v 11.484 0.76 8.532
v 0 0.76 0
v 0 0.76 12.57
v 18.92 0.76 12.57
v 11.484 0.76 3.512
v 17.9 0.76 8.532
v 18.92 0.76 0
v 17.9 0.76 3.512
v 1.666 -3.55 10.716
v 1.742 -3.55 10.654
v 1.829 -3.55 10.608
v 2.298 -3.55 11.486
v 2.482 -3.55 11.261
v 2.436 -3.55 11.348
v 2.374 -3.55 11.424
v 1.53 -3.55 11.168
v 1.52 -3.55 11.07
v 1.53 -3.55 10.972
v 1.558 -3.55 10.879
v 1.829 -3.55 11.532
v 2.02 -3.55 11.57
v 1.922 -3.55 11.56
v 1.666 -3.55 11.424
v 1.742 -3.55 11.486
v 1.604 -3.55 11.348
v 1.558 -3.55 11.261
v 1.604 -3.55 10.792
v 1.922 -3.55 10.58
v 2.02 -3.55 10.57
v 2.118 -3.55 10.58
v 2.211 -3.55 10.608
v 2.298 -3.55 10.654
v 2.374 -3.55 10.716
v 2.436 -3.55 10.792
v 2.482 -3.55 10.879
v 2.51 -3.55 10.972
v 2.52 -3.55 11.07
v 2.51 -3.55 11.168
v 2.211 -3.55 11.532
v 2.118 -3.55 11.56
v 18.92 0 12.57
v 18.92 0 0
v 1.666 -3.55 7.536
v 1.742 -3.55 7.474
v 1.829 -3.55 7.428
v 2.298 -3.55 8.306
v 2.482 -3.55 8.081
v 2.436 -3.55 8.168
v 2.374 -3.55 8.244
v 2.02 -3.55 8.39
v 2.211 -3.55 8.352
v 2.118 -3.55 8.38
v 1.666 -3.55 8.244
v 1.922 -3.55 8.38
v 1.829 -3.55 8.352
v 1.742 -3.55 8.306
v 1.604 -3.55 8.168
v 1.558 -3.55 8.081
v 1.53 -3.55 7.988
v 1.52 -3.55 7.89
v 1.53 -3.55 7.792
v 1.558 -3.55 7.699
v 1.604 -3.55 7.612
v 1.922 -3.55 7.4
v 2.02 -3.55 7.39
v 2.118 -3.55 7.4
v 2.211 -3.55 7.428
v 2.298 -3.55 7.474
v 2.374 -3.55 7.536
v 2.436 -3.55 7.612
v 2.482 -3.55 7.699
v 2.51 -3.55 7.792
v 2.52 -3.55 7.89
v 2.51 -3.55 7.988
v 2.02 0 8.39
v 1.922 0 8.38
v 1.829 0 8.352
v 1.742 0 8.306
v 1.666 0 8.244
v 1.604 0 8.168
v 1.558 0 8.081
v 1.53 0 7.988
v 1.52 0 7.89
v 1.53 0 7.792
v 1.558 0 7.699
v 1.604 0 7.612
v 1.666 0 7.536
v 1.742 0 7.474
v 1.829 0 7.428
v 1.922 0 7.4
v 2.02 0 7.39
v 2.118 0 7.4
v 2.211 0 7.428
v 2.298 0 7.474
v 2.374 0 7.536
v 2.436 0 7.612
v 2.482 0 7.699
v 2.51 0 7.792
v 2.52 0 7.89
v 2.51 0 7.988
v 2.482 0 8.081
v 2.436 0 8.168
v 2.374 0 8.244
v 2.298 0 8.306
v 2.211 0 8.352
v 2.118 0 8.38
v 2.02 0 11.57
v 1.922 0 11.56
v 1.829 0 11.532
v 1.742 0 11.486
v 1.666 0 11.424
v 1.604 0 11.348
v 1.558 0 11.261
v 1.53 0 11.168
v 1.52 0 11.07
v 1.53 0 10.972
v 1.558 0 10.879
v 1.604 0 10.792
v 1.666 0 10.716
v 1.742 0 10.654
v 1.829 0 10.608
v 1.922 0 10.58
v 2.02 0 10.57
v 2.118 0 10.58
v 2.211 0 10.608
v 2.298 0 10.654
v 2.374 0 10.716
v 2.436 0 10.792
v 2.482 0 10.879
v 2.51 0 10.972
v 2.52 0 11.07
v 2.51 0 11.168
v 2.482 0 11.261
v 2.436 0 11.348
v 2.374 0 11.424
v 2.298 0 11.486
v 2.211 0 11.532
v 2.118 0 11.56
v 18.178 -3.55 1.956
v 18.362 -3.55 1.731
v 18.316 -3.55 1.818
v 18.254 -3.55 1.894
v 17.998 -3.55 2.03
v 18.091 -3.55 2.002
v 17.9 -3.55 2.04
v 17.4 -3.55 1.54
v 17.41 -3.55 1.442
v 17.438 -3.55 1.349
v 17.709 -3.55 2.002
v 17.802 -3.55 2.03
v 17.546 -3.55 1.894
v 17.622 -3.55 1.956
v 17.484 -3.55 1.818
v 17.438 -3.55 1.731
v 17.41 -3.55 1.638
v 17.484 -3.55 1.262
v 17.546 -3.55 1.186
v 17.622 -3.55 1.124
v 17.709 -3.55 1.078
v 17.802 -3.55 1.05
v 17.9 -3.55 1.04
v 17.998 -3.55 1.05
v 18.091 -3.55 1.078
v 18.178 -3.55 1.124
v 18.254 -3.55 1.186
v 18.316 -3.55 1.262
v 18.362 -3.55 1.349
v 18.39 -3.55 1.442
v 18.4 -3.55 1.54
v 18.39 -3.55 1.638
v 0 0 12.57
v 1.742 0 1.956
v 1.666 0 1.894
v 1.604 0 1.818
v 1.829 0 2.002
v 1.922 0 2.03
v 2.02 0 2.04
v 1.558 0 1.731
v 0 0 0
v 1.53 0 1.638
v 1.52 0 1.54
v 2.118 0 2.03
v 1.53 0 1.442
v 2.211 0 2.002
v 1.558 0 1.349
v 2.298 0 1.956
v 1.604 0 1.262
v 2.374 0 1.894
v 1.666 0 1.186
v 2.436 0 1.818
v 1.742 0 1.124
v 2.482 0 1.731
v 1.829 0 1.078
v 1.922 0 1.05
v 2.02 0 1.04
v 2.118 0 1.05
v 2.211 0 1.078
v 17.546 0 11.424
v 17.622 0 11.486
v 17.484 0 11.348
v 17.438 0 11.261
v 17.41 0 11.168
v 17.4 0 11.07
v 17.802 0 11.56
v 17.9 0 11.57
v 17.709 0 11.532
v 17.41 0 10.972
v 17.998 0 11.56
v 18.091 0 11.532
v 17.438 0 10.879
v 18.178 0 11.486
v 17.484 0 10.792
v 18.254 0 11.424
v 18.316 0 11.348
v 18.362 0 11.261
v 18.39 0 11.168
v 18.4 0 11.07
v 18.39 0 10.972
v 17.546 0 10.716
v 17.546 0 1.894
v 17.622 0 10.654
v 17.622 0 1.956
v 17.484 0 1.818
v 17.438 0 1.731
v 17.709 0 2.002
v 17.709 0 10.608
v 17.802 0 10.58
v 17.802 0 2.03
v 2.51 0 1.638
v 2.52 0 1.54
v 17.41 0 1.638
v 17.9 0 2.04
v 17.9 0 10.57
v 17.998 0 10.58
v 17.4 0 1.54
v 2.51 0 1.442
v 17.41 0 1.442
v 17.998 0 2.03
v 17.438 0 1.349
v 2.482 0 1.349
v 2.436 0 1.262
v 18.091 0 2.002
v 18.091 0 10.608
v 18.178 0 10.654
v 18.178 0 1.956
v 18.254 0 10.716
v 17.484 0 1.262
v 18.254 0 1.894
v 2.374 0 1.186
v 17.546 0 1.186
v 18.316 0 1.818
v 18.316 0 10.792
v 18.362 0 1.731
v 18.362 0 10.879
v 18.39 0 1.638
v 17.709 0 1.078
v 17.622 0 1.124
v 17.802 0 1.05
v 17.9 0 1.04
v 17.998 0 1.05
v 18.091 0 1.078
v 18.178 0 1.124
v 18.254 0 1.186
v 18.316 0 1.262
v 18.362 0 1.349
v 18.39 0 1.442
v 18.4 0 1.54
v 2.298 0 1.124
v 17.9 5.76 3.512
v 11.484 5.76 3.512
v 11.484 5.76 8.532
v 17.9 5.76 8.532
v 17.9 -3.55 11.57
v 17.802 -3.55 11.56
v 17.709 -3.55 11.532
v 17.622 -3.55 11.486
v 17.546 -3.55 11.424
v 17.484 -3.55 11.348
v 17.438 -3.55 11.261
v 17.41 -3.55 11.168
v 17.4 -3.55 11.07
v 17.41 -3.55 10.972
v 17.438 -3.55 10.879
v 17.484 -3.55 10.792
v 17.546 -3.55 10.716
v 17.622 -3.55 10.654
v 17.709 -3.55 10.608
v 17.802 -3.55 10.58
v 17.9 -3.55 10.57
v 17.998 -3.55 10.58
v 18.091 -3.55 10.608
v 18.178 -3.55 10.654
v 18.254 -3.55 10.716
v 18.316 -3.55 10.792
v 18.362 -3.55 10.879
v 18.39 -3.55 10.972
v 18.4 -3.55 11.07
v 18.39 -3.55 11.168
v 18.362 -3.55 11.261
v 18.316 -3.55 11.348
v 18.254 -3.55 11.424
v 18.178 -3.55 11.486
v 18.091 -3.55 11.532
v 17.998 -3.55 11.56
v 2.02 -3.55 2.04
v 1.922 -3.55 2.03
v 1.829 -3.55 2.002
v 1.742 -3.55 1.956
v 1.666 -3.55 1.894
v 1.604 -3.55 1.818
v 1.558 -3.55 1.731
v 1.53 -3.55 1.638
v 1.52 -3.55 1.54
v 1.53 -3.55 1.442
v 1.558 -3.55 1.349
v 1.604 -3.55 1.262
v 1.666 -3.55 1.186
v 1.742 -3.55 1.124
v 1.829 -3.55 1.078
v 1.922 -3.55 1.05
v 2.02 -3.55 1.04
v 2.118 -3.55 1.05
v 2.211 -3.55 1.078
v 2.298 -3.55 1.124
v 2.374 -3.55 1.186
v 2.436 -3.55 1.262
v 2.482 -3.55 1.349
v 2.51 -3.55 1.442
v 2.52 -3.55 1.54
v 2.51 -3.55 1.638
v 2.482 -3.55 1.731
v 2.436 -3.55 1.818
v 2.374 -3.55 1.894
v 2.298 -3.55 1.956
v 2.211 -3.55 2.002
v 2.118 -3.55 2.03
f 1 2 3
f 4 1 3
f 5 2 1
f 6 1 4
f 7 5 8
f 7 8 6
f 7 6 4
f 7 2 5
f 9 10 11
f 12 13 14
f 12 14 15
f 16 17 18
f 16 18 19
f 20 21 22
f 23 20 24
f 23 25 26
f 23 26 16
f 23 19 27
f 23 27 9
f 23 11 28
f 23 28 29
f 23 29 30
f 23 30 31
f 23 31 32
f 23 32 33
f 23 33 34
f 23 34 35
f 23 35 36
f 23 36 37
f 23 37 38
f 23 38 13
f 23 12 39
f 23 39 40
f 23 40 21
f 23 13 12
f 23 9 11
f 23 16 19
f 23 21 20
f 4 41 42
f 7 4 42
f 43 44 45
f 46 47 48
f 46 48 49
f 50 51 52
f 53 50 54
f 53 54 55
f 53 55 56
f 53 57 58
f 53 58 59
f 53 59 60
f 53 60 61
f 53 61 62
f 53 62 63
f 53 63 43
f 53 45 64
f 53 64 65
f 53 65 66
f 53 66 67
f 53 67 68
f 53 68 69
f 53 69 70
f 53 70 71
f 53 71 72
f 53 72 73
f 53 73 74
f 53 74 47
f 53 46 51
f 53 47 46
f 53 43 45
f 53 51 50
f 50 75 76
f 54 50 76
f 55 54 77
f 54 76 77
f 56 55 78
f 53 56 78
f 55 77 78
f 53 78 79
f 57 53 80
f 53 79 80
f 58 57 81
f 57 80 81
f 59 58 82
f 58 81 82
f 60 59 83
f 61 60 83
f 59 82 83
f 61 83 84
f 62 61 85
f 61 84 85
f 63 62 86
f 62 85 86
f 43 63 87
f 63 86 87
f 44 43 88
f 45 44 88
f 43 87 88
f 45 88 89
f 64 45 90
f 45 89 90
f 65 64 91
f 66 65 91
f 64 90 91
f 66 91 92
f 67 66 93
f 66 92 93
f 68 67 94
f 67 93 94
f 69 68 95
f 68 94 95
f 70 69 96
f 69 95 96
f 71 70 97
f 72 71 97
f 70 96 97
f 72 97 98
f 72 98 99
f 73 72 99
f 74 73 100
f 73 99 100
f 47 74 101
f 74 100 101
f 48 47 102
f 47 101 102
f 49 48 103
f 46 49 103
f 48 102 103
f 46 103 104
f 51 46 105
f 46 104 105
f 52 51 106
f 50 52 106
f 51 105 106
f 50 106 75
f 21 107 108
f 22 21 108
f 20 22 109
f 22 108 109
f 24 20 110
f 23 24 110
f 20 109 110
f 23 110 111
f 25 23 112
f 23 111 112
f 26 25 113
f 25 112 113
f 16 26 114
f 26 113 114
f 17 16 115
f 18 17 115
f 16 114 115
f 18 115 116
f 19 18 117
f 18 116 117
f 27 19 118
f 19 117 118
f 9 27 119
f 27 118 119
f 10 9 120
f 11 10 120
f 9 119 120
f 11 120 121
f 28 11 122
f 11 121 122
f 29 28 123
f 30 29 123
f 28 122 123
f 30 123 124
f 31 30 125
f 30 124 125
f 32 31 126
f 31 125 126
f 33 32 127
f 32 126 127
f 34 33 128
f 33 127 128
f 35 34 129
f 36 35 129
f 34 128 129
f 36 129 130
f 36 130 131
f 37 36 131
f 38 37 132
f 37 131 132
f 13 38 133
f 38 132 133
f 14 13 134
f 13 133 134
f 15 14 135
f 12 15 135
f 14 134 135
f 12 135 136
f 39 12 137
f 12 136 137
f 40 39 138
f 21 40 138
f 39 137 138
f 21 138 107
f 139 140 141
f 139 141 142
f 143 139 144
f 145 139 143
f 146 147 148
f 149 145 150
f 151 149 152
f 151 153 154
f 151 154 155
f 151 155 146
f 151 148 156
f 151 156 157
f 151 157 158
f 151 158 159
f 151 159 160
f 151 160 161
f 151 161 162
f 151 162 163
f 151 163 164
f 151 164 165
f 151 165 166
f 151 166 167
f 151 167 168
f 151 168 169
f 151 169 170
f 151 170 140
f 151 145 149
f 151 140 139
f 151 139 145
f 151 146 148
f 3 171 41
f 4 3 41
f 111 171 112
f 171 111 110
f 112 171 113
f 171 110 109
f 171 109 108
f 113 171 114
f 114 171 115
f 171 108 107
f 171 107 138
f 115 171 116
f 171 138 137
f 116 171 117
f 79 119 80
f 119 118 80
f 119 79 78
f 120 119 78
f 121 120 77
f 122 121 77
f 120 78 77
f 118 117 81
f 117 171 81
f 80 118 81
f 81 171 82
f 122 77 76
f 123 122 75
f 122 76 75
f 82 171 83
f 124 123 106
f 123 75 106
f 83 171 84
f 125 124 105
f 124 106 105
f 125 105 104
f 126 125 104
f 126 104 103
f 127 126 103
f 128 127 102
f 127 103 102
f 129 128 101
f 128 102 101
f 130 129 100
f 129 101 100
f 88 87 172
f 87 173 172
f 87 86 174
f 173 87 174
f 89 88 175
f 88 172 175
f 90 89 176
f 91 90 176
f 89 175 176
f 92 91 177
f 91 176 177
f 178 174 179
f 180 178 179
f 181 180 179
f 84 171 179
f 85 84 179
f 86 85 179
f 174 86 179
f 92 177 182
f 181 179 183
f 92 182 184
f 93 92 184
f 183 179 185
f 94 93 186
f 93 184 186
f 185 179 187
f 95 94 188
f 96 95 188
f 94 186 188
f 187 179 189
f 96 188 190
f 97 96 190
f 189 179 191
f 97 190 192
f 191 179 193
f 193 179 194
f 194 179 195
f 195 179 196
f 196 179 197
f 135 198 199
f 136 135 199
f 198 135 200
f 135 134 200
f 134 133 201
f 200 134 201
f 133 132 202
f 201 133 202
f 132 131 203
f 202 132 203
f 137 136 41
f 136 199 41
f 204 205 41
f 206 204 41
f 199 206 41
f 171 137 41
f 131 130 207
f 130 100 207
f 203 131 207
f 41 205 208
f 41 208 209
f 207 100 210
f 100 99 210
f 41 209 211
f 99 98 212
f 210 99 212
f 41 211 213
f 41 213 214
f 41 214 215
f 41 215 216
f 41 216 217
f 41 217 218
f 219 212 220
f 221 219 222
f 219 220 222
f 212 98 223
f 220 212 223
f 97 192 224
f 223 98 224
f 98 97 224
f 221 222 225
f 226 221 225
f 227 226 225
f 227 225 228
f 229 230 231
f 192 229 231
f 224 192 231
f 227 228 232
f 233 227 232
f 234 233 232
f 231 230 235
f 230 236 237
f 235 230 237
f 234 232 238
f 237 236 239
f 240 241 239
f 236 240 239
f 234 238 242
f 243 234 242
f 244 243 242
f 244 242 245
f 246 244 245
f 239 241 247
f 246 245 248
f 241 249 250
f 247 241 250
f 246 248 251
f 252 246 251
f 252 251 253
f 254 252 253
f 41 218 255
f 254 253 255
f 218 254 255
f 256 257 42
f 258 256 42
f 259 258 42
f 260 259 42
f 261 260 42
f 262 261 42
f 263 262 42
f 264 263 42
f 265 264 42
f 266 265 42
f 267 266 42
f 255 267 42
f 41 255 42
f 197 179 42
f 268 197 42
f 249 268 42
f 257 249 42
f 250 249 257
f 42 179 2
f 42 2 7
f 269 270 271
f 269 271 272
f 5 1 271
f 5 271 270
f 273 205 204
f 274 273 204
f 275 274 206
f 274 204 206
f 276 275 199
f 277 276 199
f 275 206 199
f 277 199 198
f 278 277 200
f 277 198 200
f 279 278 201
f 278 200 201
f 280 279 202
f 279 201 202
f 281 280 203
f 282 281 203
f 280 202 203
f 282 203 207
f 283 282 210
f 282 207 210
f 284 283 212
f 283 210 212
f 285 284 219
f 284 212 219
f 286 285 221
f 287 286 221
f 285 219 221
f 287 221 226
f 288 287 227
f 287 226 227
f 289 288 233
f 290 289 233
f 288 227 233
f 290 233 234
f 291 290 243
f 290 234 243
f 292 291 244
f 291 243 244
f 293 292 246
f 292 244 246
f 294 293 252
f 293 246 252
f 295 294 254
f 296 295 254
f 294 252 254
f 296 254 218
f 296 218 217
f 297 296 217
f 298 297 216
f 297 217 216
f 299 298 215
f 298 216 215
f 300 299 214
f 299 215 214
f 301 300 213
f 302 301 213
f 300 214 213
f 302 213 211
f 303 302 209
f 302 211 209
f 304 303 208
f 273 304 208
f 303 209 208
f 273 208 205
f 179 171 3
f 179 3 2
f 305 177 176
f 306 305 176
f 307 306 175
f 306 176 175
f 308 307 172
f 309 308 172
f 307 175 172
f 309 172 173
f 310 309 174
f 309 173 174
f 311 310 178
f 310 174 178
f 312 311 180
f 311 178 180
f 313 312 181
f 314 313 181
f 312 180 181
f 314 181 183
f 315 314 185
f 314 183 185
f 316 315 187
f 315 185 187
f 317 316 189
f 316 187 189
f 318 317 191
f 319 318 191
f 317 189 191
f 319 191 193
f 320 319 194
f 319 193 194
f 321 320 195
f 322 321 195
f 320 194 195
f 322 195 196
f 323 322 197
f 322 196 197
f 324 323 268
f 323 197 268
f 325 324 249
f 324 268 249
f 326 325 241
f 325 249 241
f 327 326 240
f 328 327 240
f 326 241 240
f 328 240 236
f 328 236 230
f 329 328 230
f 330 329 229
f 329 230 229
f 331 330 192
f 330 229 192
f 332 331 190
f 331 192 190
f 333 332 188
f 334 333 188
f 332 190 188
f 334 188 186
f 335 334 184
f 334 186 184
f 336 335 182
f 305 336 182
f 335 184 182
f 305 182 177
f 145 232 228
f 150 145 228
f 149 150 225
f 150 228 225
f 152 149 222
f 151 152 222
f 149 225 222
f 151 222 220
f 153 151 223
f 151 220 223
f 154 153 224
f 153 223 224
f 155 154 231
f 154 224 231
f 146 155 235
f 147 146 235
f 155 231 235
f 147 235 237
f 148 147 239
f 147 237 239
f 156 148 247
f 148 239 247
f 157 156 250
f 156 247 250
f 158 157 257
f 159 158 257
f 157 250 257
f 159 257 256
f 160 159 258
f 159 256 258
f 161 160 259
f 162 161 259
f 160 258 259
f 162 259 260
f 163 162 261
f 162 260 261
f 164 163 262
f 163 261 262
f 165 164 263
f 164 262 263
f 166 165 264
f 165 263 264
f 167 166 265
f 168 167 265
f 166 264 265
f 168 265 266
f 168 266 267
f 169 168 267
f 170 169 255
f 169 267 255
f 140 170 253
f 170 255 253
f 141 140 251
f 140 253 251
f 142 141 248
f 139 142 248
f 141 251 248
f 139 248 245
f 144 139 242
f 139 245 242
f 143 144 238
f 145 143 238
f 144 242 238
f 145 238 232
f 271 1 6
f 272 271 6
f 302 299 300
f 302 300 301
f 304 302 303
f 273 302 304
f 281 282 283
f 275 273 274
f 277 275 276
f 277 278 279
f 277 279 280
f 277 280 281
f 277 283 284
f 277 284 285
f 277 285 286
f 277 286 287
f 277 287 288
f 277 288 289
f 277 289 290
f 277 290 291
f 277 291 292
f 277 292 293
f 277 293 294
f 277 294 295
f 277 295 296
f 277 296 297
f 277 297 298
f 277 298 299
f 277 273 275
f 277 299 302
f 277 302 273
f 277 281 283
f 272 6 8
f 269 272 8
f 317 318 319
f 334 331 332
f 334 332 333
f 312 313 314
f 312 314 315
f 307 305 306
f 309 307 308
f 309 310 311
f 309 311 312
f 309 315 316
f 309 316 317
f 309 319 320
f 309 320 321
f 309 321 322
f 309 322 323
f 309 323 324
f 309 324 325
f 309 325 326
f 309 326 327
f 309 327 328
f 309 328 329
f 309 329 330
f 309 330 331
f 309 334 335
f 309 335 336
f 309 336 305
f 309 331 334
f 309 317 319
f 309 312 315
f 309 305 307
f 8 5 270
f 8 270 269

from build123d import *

# Parameters (mm, degrees)
SKETCH1_W           = 18.92
SKETCH1_H           = 12.57
BOSS_EXTRUDE1_DEPTH = 0.76
SKETCH2_R           = 0.5
BOSS_EXTRUDE2_DEPTH = 3.55
SKETCH3_W           = 6.416319516
SKETCH3_H           = 5.020284278
BOSS_EXTRUDE3_DEPTH = 5


with BuildPart() as part:
    # Sketch1 → Boss-Extrude1 (new body)
    with BuildSketch(Plane(origin=(0, 0, 0), x_dir=(1, 0, 0), z_dir=(0, 1, 0))):
        with Locations((9.46, -6.285)):
            Rectangle(SKETCH1_W, SKETCH1_H)
    extrude(amount=BOSS_EXTRUDE1_DEPTH)

    # Sketch2 → Boss-Extrude2 (add)
    with BuildSketch(Plane(origin=(0, 0, 0), x_dir=(-1, 0, 0), z_dir=(0, -1, 0))):
        with Locations(Location((-2.02, -11.07, 0), (0, 0, 270))):
            Circle(SKETCH2_R)
        with Locations(Location((-17.9, -11.07, 0), (0, 0, 270))):
            Circle(SKETCH2_R)
        with Locations(Location((-2.02, -7.89, 0), (0, 0, 270))):
            Circle(SKETCH2_R)
        with Locations(Location((-2.02, -1.54, 0), (0, 0, 270))):
            Circle(SKETCH2_R)
        with Locations(Location((-17.9, -1.54, 0), (0, 0, 270))):
            Circle(SKETCH2_R)
    extrude(amount=BOSS_EXTRUDE2_DEPTH)

    # Sketch3 → Boss-Extrude3 (add)
    with BuildSketch(Plane(origin=(0, 0.76, 0), x_dir=(1, 0, 0), z_dir=(0, 1, 0))):
        with Locations((14.691840242, -6.022310706)):
            Rectangle(SKETCH3_W, SKETCH3_H)
    extrude(amount=BOSS_EXTRUDE3_DEPTH)


solid = part.part
